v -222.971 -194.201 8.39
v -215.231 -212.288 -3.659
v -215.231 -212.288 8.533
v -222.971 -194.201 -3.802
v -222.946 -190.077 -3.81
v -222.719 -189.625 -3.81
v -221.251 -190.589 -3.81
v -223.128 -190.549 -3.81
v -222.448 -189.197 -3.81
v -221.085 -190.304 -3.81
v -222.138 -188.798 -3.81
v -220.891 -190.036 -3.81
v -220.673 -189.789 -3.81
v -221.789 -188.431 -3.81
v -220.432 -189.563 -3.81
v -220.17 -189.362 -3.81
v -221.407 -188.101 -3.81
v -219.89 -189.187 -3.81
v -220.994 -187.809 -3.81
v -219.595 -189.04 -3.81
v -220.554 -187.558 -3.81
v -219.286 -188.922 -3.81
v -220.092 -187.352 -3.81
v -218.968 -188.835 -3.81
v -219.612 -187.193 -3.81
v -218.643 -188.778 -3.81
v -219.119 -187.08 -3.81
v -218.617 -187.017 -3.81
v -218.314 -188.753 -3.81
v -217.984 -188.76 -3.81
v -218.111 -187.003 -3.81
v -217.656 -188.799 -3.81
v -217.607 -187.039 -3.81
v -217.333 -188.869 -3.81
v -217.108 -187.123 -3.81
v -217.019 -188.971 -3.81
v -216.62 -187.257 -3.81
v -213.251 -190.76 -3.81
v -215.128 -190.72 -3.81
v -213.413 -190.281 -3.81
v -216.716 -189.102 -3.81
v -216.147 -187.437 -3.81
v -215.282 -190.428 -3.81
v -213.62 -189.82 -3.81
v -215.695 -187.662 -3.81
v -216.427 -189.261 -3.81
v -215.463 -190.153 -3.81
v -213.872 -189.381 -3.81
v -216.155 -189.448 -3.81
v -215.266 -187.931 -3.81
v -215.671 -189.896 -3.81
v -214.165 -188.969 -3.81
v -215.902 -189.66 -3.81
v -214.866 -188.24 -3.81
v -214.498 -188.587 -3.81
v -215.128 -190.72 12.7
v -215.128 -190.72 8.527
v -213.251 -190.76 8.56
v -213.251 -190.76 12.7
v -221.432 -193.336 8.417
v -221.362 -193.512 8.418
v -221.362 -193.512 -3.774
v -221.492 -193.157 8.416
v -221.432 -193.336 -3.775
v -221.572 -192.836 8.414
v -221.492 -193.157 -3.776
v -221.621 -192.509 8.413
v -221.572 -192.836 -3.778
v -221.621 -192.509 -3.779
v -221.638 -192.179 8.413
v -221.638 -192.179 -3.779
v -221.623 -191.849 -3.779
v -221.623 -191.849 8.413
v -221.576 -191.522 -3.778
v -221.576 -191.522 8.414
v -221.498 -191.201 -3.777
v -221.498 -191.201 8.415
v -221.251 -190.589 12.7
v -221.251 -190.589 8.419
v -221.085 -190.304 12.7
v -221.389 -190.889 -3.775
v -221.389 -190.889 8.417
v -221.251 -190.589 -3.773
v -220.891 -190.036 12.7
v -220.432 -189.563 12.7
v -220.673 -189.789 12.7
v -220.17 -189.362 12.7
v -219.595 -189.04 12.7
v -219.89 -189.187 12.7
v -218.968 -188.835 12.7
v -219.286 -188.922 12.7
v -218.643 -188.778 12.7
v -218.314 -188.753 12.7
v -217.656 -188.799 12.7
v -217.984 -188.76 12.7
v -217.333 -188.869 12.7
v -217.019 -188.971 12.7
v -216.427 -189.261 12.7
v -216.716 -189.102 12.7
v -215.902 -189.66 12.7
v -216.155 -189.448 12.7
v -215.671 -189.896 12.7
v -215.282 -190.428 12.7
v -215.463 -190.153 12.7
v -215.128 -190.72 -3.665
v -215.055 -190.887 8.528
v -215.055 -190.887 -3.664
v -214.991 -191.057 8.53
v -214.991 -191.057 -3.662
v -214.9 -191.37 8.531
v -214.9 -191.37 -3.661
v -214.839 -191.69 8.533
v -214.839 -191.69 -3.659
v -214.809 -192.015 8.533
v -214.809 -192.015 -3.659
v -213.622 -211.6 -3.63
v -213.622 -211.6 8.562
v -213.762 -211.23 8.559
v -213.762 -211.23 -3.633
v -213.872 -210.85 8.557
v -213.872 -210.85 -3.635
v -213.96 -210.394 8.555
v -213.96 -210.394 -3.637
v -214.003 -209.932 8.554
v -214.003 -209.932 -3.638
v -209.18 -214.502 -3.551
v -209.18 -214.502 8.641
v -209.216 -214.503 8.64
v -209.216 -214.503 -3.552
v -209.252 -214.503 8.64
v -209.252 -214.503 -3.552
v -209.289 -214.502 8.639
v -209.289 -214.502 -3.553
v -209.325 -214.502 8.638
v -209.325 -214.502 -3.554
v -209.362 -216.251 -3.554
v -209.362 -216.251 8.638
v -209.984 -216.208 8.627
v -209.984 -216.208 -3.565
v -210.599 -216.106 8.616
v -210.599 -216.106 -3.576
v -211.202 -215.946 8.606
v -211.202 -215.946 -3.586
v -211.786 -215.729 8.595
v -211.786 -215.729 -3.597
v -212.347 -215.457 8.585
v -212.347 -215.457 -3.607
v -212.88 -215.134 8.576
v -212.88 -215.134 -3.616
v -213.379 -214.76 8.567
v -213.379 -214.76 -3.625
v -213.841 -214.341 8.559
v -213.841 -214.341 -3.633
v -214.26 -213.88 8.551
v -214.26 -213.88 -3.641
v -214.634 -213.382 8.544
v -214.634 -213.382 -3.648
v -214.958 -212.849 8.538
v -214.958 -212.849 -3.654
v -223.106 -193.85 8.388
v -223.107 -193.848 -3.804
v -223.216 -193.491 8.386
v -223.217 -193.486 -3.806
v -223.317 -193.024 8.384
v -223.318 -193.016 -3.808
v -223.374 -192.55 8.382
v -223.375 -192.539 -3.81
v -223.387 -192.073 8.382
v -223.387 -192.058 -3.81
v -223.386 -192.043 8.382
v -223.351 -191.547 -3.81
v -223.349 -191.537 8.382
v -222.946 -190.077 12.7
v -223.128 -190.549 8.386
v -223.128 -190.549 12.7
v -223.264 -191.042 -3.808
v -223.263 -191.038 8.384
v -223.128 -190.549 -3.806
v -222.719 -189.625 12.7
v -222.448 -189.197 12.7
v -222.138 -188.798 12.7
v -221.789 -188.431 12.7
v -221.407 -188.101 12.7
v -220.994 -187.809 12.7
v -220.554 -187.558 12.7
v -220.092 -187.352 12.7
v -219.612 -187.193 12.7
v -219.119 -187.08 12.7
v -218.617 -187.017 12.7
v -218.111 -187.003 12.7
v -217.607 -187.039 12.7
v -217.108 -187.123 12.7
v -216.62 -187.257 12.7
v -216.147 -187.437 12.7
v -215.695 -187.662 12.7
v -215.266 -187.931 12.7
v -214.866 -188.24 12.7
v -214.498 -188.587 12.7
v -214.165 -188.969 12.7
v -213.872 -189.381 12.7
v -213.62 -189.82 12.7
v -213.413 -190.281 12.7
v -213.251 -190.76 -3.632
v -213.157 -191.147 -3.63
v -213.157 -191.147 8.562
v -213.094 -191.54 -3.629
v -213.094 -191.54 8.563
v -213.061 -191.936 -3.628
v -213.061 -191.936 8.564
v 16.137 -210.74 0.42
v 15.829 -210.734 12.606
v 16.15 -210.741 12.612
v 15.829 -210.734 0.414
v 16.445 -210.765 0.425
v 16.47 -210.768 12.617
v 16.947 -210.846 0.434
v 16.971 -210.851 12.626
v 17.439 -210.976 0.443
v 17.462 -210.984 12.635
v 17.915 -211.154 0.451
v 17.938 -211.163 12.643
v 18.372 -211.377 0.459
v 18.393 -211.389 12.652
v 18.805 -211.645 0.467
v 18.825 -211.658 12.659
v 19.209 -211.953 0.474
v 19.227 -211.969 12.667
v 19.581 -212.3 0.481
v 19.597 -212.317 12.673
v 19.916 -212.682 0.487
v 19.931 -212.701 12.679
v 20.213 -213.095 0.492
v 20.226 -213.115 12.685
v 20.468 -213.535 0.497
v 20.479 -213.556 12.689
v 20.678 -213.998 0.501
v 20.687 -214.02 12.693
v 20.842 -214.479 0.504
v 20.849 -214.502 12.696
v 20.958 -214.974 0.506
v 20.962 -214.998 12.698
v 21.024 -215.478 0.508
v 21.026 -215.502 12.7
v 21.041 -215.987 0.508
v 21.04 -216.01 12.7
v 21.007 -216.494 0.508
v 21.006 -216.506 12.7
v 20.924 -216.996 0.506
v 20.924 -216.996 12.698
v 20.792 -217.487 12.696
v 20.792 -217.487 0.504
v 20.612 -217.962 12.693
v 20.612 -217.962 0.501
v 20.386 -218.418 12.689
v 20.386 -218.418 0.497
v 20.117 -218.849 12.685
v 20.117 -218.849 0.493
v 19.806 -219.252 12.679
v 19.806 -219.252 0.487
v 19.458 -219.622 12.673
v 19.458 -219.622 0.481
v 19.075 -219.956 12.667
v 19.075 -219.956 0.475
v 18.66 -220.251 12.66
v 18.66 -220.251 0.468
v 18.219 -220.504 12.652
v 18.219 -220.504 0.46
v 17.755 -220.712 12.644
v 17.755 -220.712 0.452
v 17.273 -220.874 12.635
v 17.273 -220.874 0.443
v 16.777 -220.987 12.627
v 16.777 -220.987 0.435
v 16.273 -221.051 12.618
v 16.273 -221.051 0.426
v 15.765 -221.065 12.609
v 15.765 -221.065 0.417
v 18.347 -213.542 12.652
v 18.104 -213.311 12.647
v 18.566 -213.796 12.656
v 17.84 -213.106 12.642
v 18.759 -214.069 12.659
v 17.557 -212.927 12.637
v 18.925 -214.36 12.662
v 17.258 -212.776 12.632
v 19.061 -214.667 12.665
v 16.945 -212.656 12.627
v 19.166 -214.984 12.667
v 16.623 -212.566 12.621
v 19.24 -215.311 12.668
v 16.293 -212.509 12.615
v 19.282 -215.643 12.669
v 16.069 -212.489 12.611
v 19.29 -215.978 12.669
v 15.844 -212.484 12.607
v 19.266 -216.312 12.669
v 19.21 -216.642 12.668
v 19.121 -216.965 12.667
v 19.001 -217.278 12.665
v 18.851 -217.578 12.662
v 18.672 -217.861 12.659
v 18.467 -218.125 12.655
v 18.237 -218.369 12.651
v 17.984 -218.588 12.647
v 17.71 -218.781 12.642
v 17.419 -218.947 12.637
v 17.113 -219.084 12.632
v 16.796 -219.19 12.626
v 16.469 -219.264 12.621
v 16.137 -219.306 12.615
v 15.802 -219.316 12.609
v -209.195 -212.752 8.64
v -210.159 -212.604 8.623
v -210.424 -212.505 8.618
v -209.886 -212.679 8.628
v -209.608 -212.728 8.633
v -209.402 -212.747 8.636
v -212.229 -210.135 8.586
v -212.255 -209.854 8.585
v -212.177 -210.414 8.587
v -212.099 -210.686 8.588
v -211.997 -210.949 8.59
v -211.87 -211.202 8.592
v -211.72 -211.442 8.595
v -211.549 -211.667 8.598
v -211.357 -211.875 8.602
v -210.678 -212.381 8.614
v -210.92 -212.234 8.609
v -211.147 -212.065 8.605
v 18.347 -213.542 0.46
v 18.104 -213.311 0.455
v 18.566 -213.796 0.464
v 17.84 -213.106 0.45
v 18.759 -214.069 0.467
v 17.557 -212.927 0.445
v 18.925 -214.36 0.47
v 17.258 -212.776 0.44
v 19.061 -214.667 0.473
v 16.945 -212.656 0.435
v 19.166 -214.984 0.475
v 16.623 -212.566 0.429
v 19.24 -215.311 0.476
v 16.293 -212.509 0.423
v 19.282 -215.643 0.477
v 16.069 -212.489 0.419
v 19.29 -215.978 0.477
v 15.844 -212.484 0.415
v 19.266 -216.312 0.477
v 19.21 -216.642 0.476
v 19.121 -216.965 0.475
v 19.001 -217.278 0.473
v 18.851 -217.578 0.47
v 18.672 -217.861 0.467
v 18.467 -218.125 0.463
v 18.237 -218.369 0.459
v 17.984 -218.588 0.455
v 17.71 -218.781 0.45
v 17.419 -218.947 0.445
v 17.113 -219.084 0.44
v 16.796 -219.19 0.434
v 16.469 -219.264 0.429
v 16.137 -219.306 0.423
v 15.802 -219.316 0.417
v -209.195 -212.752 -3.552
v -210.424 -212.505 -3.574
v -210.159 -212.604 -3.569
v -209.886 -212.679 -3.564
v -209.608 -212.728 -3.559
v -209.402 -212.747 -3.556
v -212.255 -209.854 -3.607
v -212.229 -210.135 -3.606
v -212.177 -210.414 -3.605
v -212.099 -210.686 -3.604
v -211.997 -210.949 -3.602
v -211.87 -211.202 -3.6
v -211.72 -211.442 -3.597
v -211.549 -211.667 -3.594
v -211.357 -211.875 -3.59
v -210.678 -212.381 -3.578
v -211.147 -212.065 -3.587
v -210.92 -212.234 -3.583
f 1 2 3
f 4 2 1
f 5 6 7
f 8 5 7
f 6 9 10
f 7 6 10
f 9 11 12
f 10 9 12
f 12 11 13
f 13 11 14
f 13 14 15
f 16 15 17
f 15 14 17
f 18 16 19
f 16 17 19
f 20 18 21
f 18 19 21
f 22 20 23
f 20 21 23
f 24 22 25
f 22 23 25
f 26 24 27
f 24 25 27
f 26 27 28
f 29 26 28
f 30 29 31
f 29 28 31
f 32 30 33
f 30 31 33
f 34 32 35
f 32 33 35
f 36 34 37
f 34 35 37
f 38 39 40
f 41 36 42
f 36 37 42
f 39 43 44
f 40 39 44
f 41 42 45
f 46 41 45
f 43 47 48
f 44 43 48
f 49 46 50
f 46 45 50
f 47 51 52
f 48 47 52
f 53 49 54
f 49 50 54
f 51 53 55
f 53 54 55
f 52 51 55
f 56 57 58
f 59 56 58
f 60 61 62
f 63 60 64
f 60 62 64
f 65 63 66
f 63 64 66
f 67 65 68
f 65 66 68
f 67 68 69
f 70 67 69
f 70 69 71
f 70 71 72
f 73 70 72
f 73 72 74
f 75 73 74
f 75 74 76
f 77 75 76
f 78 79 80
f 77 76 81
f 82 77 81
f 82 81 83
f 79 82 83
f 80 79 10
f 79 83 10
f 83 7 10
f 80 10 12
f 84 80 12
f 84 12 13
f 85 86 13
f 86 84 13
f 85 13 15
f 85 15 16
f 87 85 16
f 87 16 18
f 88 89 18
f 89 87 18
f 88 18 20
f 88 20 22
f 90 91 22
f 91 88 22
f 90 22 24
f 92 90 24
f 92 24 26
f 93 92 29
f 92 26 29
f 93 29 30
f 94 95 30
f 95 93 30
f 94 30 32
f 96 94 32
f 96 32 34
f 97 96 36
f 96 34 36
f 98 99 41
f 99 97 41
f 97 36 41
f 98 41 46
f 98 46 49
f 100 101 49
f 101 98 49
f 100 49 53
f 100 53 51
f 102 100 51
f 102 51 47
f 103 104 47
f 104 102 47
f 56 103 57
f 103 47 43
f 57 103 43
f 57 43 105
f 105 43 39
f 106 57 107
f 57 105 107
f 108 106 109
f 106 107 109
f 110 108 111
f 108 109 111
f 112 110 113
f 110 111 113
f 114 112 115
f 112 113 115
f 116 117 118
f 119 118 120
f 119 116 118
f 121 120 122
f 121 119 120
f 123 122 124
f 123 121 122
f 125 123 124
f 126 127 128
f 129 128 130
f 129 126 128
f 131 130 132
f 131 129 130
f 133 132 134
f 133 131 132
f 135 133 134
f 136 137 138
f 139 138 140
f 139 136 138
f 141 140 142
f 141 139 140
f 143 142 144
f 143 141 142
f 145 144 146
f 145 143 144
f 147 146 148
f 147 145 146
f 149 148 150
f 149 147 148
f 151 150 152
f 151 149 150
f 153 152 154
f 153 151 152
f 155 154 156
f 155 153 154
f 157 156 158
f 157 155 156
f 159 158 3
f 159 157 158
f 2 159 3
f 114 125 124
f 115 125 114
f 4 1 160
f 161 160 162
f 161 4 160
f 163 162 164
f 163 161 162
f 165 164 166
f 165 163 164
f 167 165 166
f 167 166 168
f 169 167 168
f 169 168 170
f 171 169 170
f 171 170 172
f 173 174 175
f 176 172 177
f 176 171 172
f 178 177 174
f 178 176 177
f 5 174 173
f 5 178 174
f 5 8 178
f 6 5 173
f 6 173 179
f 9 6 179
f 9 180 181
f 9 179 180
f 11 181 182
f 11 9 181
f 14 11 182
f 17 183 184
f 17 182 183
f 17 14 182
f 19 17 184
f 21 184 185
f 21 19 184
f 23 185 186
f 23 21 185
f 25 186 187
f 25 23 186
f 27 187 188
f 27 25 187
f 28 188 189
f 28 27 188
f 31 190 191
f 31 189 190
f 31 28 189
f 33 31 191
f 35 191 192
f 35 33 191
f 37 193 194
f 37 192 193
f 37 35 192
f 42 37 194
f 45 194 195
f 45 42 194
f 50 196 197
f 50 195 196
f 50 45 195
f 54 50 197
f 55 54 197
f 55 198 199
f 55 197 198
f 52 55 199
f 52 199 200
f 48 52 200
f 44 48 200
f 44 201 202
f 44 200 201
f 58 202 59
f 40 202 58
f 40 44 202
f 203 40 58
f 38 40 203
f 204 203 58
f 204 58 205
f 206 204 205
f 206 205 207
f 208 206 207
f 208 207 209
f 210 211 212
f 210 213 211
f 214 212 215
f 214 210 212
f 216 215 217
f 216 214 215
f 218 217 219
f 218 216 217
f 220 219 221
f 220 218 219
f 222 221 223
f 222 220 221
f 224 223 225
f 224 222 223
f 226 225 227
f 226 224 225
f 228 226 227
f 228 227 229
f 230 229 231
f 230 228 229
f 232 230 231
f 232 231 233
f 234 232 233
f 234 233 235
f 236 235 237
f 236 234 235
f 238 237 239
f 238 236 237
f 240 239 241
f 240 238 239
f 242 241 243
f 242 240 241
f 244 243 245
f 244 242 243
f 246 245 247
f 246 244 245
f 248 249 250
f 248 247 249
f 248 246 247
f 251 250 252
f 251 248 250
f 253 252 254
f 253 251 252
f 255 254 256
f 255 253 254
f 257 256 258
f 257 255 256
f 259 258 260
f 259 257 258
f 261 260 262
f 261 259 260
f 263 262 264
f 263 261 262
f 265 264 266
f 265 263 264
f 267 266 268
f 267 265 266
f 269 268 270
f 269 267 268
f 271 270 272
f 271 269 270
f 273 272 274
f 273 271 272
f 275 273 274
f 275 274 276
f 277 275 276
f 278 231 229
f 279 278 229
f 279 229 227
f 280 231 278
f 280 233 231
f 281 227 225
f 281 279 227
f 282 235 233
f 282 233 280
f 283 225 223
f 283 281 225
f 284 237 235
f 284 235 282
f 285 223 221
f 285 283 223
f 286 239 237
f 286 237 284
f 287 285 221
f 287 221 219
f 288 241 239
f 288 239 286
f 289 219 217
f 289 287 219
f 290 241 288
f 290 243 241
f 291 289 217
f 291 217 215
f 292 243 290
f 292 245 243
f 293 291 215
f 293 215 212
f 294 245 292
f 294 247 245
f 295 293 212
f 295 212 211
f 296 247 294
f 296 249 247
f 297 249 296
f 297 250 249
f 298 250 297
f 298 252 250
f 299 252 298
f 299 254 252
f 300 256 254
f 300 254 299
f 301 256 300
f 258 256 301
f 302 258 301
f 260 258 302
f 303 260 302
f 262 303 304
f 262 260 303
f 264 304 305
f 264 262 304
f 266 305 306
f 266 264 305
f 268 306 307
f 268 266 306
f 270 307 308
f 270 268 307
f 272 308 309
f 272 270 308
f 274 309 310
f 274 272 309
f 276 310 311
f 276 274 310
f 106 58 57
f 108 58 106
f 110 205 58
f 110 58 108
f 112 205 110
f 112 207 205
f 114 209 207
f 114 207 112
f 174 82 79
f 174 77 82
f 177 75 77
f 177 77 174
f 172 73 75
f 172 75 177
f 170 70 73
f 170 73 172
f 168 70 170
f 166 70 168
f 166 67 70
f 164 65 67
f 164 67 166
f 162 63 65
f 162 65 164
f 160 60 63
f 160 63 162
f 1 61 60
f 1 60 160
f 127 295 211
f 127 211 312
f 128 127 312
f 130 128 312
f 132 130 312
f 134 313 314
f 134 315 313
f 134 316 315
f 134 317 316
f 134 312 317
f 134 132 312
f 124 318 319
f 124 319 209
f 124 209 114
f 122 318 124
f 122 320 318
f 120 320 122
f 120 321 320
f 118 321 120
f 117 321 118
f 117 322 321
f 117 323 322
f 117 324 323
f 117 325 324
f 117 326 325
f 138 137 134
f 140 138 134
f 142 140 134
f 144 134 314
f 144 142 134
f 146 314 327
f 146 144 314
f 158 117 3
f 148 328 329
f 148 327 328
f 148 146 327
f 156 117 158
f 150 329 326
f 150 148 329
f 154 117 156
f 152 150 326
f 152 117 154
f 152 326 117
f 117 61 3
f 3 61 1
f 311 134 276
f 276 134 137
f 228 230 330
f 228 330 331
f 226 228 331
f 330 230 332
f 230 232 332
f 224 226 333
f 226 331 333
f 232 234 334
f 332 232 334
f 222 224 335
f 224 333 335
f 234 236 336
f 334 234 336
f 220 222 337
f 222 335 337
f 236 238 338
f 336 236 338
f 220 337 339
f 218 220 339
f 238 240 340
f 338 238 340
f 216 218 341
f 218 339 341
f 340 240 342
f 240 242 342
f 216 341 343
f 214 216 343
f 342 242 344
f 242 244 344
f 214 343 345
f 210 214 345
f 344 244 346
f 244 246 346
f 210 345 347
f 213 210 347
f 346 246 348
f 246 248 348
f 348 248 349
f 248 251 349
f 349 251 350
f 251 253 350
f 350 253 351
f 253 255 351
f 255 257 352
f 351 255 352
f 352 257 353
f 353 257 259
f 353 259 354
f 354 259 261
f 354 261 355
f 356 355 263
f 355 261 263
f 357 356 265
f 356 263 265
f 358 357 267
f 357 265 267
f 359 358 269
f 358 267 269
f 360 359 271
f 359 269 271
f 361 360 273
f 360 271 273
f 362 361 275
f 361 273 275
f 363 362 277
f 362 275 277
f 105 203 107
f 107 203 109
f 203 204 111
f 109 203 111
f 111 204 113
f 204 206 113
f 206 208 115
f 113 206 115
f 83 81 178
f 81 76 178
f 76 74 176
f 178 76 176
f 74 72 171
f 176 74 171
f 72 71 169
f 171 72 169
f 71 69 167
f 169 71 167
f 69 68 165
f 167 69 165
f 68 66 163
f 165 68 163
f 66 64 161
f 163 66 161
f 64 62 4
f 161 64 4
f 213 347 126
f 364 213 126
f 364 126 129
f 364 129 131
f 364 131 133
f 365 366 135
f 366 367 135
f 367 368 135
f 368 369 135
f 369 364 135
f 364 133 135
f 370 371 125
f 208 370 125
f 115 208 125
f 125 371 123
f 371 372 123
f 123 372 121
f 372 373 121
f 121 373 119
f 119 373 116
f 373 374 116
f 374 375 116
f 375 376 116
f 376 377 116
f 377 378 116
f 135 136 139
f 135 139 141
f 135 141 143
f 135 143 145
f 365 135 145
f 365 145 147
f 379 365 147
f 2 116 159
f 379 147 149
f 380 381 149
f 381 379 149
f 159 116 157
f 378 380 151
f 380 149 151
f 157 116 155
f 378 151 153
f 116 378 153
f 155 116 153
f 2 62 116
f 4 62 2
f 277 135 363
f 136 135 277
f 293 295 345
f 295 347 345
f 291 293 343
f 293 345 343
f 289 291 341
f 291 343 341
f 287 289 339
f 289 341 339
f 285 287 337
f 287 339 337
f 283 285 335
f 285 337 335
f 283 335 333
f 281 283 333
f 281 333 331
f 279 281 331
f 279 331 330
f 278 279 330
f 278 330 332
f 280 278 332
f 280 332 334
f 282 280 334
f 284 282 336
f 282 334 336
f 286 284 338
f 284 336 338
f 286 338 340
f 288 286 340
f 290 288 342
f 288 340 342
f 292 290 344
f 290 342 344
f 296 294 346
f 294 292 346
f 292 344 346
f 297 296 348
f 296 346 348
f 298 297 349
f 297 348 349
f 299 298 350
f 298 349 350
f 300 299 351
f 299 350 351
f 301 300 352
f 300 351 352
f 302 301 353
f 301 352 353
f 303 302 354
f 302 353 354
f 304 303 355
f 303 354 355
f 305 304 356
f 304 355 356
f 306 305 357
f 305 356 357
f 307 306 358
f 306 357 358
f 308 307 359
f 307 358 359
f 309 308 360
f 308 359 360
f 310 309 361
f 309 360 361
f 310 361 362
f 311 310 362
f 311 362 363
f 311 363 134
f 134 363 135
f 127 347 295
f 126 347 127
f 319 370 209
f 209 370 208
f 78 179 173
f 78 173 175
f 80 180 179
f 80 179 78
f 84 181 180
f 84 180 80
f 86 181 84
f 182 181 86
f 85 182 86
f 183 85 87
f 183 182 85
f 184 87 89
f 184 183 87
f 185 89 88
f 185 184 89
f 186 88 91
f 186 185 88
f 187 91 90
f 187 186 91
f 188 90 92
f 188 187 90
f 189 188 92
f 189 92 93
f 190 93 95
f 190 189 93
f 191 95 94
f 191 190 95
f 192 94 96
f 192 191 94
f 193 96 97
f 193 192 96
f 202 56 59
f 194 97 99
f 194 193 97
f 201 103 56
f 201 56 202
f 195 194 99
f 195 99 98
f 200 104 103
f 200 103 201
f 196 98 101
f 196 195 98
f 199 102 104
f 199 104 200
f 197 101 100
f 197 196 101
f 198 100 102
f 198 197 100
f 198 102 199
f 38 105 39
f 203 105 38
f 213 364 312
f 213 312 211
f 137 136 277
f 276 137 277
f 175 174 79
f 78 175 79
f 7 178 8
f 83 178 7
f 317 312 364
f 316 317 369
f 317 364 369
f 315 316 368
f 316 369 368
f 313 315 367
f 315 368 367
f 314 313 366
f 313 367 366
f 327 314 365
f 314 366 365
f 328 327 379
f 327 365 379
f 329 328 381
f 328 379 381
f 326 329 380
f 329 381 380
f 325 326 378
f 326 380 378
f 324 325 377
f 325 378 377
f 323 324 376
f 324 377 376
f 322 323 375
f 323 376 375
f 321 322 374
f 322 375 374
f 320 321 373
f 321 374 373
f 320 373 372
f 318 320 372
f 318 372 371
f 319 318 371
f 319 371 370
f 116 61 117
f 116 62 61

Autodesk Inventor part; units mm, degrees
ref_plane "YZ Plane" through (0, 0, 0) normal (1, 0, 0) x (0, 1, 0)
ref_plane "XZ Plane" through (0, 0, 0) normal (0, 1, 0) x (-1, 0, 0)
ref_plane "XY Plane" through (0, 0, 0) normal (0, 0, 1) x (1, 0, 0)
sketch "Sketch1" plane through (0, 0, 0) normal (0, 0, 1) x (1, 0, 0)
  circle A0 centre (-218.2217, -192.1682) radius 3.0353 construction
  circle A1 centre (-209.2225, -209.7173) radius 3.0353 construction
  circle A2 centre (15.875, -215.9) radius 3.0353 construction
  arc A3 (-212.2548, -209.8537) -> (-209.1953, -212.7525) centre (-209.2225, -209.7173) ccw
  arc A4 (-214.8089, -192.0147) -> (-221.3625, -193.5122) centre (-218.2217, -192.1682) ccw
  arc A5 (-213.0607, -191.936) -> (-222.9714, -194.2008) centre (-218.2217, -192.1682) ccw
  arc A6 (15.802, -219.3155) -> (15.8444, -212.4838) centre (15.875, -215.9) ccw
  arc A7 (15.7646, -221.0651) -> (15.8287, -210.7339) centre (15.875, -215.9) ccw
  line L0 (-212.2548, -209.8537) -> (-213.0607, -191.936)
  line L1 (-215.2308, -212.2885) -> (-222.9714, -194.2008)
  line L2 (-221.3625, -193.5122) -> (-213.6219, -211.6)
  line L3 (-214.003, -209.9323) -> (-214.8089, -192.0147)
  line L4 (-209.1953, -212.7525) -> (15.8287, -210.7339)
  line L5 (15.8444, -212.4838) -> (-209.1796, -214.5024)
  line L6 (15.802, -219.3155) -> (-209.3248, -214.5015)
  line L7 (-209.3623, -216.2511) -> (15.7646, -221.0651)
  arc A8 (-214.003, -209.9323) -> (-209.1796, -214.5024) centre (-209.2225, -209.7173) ccw
  arc A9 (-215.2308, -212.2885) -> (-209.3623, -216.2511) centre (-209.2225, -209.7173) ccw
  arc A10 (-204.6436, -214.6016) -> (-204.4975, -214.4604) centre (-209.2225, -209.7173) ccw
  point P0 (0, 0)
  point P1 (-192.7723, -212.6051)
  point P2 (-183.4432, -220.9999)
  point P3 (-202.7453, -212.6946)
  point P4 (-199.5727, -216.4604)
  point P5 (-186.4, -216.7421)
  dimension "d0" = 0
  dimension "d2" = 0.381
  dimension "d3" = 1.75
  dimension "d9" = 1.75
  dimension "d10" = 1.75
  dimension "d11" = 0.381
  dimension "d12" = 1.75
extrude "main bands" add sketch "Sketch1" along normal blind 12.7 and the other way blind 3.81
sketch "Sketch2" plane through (15.7646, -221.0651, -3.81) normal (-0.0213787, -0.9997714, 0) x (0.9997714, -0.0213787, 0)
  line L0 (5.1663, 0) -> (5.1663, 16.51) projected
  line L1 (-225.1783, 16.51) -> (0, 16.51) projected
  line L2 (0, 0) -> (-225.1783, 0) projected
  line L3 (-239.7169, 0) -> (-239.7169, 16.51) projected
  line L4 (-239.7169, 0) -> (-229.3956, 0) projected
  line L5 (5.1663, 4.318) -> (-239.7169, 0)
  line L6 (0, 0) -> (5.1663, 0)
  line L7 (-239.7169, 0) -> (-225.1783, 0)
  line L8 (-229.3956, 16.51) -> (-239.7169, 16.51) projected
  line L9 (-239.7169, 16.51) -> (-225.1783, 16.51)
  line L10 (5.1663, 16.51) -> (0, 16.51)
  line L11 (5.1663, 16.51) -> (-239.7169, 12.192)
  point P0 (-20.487, 3.81)
  point P1 (-239.2557, 0)
  point P2 (-239.2557, 16.51)
  dimension "d17" = 4.318
  dimension "d18" = 4.318
extrude "diagonal cuts" cut sketch "Sketch2" against normal blind 25.4 contours L6 L2 L7 L4 L5 L0 | L11 L3 L8 L9 L1 L10
ref_plane "inside edge" through (0, 0, 0) normal (0, 0, -1) x (-1, 0, 0)
properties part number "Cata rubber bands"
